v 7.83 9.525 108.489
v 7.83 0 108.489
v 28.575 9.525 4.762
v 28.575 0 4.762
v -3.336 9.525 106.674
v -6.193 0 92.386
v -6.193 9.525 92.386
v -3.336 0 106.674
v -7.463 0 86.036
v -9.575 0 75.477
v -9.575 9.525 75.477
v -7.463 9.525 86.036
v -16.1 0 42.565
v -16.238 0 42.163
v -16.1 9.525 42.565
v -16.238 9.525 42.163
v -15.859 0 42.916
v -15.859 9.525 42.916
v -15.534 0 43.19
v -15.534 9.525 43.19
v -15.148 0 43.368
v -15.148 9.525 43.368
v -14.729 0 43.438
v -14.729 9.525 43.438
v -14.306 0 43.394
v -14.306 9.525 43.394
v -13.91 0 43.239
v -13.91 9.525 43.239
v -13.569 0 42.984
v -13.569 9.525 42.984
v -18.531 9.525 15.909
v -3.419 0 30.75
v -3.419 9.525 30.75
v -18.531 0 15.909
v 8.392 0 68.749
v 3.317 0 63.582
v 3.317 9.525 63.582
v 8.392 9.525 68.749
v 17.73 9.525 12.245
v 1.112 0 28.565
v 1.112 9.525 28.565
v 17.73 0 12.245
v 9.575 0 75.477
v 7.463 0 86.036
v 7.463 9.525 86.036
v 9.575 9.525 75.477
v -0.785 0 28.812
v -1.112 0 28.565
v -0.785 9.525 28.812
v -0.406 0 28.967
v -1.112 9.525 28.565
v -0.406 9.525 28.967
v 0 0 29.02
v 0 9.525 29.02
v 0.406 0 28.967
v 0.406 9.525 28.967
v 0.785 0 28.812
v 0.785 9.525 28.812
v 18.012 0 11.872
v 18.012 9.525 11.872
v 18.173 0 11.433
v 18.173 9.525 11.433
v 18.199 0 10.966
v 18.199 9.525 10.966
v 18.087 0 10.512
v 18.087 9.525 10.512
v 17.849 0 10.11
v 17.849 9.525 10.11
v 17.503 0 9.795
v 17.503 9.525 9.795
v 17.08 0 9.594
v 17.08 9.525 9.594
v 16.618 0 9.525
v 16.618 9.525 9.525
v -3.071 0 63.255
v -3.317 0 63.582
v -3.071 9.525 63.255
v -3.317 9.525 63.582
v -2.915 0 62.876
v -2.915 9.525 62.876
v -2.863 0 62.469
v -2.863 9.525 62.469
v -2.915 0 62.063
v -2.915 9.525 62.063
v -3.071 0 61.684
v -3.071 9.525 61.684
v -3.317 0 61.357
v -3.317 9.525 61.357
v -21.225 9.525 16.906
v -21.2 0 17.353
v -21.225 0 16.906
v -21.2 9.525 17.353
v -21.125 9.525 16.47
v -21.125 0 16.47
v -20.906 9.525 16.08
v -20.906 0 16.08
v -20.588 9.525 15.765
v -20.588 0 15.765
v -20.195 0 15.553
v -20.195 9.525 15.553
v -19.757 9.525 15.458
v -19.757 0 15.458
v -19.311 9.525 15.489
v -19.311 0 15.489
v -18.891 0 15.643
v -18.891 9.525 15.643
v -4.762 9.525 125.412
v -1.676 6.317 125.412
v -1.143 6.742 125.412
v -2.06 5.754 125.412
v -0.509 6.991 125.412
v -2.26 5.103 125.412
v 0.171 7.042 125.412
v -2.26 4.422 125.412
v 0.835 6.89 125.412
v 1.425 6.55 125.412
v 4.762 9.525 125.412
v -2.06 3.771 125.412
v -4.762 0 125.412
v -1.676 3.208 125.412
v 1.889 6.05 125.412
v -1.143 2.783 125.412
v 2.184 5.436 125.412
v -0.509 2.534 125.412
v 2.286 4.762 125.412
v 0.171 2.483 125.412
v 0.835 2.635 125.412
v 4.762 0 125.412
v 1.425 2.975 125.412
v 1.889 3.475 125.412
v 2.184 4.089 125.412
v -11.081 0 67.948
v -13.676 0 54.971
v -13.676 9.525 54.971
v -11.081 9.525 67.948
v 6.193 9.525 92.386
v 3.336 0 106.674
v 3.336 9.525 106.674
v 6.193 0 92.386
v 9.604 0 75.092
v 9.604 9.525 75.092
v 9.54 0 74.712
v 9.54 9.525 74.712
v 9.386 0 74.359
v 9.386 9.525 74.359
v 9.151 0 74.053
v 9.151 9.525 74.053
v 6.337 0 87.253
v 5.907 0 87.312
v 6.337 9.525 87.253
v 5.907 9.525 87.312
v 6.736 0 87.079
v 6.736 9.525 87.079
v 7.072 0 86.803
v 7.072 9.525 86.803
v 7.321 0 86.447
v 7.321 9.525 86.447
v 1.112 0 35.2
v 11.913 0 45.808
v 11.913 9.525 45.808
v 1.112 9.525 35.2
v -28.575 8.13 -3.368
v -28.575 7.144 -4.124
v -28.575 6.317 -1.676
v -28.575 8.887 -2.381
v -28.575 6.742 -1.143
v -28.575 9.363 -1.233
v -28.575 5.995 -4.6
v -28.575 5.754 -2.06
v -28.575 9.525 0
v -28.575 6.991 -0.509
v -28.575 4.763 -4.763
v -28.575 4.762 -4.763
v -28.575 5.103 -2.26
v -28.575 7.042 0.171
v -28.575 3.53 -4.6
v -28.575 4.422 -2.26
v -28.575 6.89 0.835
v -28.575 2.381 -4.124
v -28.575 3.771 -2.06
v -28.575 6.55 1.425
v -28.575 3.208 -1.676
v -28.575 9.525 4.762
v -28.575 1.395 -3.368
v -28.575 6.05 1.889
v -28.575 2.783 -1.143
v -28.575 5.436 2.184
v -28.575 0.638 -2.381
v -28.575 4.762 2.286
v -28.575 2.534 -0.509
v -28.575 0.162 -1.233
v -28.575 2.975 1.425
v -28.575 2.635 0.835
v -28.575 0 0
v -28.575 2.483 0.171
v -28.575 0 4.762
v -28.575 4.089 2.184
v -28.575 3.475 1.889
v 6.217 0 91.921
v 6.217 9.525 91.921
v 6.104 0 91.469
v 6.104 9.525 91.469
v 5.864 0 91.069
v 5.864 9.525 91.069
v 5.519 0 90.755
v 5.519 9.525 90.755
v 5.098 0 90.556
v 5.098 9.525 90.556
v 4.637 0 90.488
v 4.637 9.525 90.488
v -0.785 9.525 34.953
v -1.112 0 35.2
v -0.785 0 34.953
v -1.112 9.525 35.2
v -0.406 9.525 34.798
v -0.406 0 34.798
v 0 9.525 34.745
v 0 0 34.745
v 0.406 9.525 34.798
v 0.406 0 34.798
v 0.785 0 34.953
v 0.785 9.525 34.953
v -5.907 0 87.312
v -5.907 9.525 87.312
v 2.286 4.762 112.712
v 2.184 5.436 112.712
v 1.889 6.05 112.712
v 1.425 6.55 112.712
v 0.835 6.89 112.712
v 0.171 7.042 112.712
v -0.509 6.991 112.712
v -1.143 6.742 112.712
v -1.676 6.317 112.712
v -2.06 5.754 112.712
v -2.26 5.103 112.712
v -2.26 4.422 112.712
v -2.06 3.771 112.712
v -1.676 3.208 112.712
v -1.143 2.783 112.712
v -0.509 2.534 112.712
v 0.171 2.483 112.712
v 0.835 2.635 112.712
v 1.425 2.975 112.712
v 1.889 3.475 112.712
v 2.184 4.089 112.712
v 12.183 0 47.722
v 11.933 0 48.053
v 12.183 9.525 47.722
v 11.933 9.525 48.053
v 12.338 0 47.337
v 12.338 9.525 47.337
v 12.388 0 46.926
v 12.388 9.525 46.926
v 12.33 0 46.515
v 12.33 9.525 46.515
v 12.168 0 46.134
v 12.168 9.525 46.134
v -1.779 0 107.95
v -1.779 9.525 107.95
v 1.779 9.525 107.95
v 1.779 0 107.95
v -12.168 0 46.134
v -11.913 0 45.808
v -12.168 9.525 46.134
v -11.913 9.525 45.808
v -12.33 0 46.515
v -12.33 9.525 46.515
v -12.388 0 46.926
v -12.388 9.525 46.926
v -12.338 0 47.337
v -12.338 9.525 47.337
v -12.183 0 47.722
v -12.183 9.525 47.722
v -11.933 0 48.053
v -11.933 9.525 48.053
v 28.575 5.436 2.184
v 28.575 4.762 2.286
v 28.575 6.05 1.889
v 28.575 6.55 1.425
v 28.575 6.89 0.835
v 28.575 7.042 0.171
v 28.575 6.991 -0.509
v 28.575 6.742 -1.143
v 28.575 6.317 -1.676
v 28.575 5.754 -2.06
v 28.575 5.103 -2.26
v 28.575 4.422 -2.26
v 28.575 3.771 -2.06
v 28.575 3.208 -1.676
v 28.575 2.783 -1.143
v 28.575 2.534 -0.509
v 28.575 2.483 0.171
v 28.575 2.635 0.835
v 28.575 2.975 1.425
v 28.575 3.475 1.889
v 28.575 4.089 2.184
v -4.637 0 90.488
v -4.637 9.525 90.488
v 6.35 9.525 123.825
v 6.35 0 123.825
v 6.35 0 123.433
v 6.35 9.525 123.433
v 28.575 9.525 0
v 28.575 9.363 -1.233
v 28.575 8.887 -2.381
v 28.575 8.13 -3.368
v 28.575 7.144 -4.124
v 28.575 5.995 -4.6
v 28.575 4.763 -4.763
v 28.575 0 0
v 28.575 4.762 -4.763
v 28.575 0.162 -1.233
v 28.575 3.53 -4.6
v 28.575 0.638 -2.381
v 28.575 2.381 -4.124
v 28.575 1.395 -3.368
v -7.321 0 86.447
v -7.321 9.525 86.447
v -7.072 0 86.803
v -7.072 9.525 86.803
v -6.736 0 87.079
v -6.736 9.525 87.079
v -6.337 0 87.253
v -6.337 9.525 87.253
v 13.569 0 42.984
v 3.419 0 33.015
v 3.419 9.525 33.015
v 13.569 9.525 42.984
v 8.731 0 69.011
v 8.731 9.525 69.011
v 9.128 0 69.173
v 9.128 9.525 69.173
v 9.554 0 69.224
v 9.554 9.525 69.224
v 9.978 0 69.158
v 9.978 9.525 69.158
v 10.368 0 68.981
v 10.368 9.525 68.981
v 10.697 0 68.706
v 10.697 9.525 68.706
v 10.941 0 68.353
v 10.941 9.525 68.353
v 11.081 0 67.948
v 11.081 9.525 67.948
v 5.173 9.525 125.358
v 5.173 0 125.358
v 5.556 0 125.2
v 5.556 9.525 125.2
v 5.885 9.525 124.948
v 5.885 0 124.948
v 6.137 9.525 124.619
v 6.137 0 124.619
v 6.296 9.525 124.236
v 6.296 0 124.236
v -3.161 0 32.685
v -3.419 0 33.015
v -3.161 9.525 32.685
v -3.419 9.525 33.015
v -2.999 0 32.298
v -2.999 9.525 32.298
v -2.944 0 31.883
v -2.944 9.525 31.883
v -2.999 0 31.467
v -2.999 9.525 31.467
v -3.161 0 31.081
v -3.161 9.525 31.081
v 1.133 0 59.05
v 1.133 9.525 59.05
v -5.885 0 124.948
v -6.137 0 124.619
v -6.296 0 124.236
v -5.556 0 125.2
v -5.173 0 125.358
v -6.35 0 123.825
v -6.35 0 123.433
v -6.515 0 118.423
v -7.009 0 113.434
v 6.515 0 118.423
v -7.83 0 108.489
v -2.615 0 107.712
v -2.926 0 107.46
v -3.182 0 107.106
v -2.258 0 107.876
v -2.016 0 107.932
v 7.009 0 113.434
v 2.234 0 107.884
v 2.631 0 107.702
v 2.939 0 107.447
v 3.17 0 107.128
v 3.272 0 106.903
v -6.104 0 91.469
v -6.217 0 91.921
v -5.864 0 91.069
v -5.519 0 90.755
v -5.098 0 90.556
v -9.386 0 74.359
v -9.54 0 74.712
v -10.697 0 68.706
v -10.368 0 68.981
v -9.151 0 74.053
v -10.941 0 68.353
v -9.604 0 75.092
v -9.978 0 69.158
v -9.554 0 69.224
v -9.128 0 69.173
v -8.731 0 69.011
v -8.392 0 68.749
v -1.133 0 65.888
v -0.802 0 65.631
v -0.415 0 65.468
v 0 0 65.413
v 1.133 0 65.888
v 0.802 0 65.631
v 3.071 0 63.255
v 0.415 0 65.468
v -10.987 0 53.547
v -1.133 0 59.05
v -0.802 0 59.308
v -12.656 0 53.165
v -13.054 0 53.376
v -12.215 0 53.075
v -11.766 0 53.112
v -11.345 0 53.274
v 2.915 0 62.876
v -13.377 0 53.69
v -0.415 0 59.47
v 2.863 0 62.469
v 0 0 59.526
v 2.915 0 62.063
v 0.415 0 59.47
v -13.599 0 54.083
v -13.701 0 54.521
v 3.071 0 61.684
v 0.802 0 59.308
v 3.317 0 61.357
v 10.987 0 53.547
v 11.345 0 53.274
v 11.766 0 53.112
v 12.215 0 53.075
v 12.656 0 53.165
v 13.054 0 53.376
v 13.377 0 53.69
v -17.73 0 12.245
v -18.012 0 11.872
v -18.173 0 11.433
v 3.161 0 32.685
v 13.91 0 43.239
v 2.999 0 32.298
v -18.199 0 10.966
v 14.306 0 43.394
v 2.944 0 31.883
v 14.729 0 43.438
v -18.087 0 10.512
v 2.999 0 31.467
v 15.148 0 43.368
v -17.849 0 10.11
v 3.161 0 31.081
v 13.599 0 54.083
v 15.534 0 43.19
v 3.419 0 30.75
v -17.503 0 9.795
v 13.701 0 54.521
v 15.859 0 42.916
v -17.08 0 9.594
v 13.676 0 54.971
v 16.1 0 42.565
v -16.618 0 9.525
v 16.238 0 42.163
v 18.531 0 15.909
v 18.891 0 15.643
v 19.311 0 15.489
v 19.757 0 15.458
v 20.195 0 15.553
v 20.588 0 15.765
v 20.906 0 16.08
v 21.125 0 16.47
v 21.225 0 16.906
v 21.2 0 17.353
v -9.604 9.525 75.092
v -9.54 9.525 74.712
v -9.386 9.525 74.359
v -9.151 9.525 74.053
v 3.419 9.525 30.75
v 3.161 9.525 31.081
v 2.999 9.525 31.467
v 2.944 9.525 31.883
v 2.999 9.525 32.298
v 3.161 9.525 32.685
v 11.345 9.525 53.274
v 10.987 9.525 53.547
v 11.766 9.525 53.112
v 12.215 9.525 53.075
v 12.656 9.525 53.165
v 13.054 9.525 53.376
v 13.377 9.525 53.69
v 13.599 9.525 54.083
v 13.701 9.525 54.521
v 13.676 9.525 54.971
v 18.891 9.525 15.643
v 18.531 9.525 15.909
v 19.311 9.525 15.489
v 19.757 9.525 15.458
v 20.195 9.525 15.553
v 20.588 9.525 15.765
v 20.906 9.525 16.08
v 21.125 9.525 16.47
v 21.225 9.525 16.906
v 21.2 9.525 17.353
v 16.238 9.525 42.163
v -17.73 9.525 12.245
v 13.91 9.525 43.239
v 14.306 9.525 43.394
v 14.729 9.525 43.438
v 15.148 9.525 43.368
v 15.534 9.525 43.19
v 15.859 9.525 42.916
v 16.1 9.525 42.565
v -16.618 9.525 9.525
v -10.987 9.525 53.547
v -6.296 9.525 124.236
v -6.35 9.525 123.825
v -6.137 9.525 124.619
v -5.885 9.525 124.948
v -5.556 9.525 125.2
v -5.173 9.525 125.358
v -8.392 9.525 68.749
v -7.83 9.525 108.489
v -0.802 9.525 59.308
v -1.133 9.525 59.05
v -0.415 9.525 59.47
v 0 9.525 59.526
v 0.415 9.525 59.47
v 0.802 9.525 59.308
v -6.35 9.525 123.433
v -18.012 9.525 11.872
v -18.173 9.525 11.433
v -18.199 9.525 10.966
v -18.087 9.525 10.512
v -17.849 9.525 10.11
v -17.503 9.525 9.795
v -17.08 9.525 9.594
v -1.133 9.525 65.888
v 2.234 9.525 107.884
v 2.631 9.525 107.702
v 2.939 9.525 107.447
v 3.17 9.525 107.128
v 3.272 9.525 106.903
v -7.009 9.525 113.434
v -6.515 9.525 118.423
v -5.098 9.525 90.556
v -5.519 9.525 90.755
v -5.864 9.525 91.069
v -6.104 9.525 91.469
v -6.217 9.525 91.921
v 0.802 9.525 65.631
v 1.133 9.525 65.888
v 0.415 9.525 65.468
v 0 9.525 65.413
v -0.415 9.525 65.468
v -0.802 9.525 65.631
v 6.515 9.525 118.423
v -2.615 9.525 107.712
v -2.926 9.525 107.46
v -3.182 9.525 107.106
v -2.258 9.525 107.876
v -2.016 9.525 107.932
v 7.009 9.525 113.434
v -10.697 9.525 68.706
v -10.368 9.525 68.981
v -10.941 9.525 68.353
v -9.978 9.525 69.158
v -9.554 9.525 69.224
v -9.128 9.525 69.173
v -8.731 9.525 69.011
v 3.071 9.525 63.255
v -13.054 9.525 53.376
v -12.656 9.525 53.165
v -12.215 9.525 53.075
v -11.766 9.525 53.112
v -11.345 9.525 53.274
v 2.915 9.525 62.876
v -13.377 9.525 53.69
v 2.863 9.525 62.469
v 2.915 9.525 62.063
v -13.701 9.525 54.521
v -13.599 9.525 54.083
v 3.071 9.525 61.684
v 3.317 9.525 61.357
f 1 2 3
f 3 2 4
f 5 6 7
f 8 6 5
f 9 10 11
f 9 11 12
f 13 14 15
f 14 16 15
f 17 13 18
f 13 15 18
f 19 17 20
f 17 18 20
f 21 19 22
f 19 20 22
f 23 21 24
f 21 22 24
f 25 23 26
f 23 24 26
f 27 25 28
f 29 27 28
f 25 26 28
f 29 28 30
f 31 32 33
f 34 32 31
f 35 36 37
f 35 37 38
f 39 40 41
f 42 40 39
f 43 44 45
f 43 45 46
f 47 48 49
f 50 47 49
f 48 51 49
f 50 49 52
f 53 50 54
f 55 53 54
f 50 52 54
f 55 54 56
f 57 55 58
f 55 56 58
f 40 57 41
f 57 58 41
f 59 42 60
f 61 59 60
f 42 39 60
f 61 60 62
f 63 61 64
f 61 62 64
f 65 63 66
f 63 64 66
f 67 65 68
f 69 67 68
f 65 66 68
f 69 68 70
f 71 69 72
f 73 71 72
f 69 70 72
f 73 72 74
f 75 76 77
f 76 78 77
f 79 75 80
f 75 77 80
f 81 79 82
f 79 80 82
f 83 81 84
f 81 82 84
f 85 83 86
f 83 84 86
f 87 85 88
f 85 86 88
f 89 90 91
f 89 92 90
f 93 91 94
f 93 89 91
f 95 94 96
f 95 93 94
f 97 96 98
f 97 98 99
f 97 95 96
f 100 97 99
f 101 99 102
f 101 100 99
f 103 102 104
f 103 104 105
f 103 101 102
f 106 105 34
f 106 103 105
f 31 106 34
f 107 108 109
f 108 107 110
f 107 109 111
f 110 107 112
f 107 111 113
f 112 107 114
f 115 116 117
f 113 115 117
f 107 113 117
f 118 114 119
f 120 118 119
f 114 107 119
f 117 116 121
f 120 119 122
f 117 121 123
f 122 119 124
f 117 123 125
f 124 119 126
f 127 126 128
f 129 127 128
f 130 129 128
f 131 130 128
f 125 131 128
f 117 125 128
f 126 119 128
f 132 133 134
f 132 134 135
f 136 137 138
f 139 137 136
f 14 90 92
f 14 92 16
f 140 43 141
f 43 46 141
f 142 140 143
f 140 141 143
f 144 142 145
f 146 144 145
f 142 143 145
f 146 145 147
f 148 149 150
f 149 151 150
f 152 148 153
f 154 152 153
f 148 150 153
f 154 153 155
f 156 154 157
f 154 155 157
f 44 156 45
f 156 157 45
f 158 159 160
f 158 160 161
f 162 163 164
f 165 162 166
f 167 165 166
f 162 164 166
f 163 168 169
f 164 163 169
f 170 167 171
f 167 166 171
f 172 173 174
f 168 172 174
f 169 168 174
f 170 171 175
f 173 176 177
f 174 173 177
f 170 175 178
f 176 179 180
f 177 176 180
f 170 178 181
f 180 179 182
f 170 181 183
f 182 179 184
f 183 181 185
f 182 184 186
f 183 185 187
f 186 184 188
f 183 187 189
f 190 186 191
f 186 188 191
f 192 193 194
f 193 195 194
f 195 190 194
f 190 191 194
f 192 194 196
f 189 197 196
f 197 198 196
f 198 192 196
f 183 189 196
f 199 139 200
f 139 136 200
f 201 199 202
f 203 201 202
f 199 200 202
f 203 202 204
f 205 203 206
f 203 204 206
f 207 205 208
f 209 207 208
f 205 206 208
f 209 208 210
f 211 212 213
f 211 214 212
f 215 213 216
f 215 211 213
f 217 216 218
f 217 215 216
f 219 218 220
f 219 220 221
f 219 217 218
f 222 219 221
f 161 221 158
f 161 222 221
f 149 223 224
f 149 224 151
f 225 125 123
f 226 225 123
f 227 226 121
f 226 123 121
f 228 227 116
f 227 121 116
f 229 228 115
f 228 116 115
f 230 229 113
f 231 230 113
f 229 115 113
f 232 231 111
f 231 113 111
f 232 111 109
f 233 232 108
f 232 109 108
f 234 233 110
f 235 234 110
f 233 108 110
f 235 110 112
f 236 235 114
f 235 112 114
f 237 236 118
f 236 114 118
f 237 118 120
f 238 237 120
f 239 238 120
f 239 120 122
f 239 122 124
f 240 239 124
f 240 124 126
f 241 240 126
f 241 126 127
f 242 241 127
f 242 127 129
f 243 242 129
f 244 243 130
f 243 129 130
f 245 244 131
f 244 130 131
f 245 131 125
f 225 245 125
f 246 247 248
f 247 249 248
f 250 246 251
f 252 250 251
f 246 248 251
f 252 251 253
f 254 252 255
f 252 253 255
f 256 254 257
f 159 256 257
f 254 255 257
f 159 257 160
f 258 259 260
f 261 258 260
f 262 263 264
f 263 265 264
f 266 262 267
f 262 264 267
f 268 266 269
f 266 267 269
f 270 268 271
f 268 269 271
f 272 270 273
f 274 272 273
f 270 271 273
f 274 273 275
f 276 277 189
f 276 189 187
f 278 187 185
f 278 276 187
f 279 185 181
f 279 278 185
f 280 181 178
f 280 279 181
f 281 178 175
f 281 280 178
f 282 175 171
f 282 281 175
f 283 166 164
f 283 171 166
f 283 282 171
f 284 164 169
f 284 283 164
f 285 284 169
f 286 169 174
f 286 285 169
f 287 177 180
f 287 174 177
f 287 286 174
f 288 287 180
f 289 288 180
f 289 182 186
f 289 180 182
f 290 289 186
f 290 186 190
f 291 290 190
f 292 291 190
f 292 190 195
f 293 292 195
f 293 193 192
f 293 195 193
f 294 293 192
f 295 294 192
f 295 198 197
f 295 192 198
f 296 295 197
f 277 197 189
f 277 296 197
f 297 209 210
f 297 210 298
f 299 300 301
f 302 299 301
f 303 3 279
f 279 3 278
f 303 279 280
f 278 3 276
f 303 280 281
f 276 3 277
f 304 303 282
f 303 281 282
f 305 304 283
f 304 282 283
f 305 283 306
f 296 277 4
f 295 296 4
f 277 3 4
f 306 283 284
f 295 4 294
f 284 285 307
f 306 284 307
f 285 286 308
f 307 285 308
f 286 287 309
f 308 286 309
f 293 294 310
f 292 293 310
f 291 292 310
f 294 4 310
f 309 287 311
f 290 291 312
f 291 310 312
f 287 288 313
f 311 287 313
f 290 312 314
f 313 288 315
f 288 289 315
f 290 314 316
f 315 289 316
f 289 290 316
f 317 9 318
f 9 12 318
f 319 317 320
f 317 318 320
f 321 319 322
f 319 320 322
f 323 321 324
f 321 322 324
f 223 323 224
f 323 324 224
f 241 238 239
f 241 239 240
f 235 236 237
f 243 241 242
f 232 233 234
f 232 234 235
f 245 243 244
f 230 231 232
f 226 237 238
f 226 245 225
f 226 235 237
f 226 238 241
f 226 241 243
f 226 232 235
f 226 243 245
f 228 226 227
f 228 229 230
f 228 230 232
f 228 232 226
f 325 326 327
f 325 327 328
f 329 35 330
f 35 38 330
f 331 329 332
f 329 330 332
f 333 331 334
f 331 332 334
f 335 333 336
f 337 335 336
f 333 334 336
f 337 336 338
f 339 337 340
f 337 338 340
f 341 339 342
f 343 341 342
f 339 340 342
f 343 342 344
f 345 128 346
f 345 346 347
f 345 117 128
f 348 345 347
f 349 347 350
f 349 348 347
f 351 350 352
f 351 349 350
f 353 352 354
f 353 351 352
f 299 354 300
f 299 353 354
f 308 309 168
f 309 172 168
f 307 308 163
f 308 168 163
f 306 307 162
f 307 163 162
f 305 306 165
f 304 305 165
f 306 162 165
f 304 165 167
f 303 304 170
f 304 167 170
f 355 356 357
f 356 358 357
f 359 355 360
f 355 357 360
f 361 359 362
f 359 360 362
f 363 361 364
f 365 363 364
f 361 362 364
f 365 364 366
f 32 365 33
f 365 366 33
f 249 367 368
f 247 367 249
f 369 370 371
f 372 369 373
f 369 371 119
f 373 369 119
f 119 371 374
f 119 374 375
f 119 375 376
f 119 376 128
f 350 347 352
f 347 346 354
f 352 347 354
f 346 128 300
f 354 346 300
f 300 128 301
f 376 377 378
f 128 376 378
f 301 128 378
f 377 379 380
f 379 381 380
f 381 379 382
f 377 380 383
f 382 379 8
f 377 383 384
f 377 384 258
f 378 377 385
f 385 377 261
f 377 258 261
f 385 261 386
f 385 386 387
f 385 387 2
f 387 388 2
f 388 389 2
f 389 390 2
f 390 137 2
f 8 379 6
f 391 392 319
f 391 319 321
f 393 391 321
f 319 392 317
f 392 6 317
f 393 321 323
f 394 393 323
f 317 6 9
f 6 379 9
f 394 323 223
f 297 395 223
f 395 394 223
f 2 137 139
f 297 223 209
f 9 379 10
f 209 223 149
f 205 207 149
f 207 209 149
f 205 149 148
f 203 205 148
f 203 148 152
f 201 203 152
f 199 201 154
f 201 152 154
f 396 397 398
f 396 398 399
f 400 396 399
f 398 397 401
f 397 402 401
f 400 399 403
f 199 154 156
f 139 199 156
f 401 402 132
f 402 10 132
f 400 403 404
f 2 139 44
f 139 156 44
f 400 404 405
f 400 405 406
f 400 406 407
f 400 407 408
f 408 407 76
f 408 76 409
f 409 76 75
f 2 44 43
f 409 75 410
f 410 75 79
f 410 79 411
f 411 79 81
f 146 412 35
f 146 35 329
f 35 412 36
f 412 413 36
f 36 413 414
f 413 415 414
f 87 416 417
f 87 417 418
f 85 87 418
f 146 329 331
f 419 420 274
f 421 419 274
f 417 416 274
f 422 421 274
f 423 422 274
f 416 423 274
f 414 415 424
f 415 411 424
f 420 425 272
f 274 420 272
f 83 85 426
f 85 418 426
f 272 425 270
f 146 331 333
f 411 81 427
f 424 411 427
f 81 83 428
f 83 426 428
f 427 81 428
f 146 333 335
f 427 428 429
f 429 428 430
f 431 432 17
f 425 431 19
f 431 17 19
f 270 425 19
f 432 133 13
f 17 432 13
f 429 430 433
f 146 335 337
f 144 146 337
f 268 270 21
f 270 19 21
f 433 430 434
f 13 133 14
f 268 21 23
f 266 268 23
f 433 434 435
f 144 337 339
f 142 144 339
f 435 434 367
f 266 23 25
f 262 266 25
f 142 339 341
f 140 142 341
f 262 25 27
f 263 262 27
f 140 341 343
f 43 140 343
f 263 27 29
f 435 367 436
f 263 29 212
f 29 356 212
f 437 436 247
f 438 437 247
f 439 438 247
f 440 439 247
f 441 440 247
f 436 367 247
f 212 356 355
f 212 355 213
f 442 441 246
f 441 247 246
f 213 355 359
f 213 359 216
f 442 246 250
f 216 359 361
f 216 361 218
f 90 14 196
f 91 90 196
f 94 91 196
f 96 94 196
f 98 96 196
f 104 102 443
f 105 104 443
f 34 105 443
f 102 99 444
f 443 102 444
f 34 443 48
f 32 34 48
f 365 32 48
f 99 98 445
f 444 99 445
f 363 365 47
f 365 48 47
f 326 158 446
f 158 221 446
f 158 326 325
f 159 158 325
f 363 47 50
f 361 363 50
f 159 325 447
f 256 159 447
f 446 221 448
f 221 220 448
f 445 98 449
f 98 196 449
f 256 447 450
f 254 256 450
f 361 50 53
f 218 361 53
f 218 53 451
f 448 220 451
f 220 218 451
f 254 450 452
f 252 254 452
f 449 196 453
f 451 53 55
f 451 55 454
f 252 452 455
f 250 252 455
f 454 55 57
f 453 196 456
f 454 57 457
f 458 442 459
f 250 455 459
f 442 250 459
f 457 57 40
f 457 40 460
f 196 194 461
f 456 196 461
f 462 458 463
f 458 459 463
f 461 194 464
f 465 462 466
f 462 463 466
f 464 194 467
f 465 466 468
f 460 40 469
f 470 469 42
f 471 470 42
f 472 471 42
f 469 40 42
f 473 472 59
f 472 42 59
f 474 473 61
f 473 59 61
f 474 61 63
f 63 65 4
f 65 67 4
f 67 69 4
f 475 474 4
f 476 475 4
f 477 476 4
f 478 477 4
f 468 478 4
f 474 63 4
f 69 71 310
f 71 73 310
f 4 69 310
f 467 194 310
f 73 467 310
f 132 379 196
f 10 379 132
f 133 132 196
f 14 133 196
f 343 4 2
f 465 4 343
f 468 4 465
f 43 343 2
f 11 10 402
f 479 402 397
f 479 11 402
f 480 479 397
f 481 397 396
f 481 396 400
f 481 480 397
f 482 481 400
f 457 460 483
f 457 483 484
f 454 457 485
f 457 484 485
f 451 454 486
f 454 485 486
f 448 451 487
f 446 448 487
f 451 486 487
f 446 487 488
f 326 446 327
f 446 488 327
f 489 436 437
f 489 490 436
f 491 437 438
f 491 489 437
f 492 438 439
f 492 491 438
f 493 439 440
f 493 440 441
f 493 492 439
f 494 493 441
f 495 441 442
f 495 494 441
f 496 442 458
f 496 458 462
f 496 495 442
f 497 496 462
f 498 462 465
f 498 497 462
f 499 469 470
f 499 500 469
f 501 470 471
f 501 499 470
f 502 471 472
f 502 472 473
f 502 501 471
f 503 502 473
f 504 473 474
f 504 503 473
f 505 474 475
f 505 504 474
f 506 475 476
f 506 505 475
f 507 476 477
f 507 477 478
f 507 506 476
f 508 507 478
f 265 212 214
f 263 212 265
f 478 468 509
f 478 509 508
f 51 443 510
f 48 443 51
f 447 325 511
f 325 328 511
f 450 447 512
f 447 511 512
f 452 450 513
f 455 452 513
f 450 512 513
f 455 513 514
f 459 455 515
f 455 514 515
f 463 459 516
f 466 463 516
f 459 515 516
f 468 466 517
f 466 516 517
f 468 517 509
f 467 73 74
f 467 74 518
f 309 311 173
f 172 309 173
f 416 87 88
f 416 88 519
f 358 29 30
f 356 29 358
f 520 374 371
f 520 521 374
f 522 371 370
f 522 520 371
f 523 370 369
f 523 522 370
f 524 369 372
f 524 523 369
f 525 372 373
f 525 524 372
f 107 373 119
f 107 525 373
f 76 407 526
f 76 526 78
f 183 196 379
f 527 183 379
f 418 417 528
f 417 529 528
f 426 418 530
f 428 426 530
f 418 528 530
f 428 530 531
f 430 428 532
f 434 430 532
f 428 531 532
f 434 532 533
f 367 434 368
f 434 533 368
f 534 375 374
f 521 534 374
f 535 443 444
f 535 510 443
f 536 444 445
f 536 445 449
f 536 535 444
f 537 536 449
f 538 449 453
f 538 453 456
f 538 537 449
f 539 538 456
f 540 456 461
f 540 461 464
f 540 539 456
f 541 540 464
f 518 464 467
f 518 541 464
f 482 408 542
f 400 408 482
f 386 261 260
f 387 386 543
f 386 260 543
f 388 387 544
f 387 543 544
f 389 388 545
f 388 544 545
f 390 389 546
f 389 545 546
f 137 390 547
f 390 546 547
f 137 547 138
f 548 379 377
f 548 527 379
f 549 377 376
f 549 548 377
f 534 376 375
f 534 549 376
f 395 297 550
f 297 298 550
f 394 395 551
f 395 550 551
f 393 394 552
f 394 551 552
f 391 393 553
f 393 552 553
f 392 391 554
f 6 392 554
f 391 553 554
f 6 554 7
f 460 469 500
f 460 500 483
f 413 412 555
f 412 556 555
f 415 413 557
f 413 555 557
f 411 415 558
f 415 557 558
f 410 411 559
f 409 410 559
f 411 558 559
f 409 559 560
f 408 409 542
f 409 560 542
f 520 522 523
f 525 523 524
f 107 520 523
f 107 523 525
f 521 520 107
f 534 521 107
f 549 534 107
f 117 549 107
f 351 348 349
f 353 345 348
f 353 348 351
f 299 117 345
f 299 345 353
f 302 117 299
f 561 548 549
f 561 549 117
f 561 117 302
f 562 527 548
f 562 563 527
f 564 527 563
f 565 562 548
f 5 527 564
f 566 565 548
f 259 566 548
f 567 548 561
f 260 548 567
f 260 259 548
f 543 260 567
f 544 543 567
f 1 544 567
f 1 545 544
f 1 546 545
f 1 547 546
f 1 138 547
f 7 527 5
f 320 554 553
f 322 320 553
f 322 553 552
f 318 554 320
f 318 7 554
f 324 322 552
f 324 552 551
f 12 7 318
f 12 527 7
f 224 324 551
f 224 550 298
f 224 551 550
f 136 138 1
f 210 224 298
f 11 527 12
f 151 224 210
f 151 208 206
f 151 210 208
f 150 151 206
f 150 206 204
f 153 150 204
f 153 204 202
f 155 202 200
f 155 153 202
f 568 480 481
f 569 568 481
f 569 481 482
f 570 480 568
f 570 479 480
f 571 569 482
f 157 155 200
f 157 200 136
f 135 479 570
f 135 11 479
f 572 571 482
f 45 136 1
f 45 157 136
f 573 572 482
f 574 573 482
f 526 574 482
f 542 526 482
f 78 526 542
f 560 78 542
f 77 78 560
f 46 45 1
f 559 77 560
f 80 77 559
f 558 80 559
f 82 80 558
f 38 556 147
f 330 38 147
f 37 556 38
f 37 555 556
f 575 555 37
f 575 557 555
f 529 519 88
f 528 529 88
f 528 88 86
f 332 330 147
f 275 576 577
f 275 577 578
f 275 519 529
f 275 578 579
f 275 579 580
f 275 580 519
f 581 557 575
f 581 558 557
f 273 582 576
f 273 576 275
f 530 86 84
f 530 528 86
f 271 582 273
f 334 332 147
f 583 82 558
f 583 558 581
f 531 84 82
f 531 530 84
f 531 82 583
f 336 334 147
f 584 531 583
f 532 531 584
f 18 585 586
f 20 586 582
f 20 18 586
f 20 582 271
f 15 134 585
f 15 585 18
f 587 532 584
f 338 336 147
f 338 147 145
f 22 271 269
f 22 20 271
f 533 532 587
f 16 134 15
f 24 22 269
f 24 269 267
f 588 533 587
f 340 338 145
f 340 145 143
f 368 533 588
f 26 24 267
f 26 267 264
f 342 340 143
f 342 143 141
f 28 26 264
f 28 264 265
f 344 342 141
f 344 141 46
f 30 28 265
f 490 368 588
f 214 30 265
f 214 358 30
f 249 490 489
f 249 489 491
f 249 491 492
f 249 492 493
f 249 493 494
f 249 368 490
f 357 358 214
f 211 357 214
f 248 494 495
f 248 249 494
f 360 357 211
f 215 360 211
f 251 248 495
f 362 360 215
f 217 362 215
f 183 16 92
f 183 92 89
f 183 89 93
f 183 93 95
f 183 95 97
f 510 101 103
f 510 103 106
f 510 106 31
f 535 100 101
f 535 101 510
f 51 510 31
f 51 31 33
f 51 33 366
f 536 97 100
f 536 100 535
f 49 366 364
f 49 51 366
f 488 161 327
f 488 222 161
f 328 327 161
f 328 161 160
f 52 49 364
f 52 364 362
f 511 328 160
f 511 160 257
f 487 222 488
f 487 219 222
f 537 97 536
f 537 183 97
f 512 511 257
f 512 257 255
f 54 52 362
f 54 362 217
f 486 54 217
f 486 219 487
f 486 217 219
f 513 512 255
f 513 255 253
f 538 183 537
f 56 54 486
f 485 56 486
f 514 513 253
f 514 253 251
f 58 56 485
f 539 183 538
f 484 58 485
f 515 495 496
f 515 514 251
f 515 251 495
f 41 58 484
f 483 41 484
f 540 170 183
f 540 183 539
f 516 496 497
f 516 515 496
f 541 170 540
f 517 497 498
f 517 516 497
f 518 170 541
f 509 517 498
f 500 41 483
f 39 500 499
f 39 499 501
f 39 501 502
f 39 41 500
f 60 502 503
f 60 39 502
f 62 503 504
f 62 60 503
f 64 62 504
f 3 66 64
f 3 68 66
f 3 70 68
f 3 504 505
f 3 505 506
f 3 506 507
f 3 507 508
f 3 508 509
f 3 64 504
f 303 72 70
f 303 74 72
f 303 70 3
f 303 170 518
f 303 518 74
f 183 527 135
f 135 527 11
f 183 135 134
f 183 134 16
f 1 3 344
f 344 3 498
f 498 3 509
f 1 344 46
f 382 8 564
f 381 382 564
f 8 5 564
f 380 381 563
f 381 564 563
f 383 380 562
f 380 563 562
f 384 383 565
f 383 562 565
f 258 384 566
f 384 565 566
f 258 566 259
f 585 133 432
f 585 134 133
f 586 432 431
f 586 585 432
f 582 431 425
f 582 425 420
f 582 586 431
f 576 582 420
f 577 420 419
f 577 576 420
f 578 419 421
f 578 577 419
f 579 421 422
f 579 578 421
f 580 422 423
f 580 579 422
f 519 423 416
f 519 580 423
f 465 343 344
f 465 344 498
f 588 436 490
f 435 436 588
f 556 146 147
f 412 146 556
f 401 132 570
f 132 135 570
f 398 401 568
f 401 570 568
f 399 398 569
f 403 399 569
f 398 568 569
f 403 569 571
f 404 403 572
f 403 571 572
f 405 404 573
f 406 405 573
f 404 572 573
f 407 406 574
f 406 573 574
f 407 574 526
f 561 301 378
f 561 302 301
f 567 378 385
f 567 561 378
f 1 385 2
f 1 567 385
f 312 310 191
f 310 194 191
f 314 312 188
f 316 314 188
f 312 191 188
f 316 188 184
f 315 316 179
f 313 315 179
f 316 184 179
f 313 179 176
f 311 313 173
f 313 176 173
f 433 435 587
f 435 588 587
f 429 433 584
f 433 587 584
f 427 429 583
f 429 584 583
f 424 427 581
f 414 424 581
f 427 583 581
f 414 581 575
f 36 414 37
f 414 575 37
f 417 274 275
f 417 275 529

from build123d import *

# Parameters (mm, degrees)
BOSS_EXTRUDE1_DEPTH     = 9.525
CUT_EXTRUDE2_DEPTH      = 139.148989433
CUT_EXTRUDE2_DEPTH_BACK = 139.148989433
SKETCH6_R               = 2.286
SKETCH7_R               = 2.286
CUT_EXTRUDE3_DEPTH      = 12.7
FILLET3_R               = 76.2
FILLET4_R               = 1.5875
FILLET5_R               = 4.7625
CUT_EXTRUDE4_DEPTH      = 129.978879691
CUT_EXTRUDE4_DEPTH_BACK = 129.978879691
FILLET6_R               = 1.5875


with BuildPart() as part:
    # Sketch1 → Boss-Extrude1 (new body)
    with BuildSketch(Plane(origin=(0, 0, 0), x_dir=(1, 0, 0), z_dir=(0, 1, 0))):
        Polygon((-28.575, 4.7625), (-28.575, -4.7625), (-6.35, -115.8875), (-6.35, -125.4125), (6.35, -125.4125), (6.35, -115.8875), (28.575, -4.7625), (28.575, 4.7625), align=None)
    extrude(amount=BOSS_EXTRUDE1_DEPTH)

    # Sketch6 → Cut-Extrude2 (cut, two sides: drawn at the far end of the back side and taken through both)
    with BuildSketch(Plane.ZY.offset(28.575).offset(-CUT_EXTRUDE2_DEPTH_BACK)):
        with Locations((0, 4.7625)):
            Circle(SKETCH6_R)
    extrude(amount=CUT_EXTRUDE2_DEPTH + CUT_EXTRUDE2_DEPTH_BACK, mode=Mode.SUBTRACT)

    # Sketch7 → Cut-Extrude3 (cut)
    with BuildSketch(Plane.XY.offset(125.4125)):
        with Locations((0, 4.7625)):
            Circle(SKETCH7_R)
    extrude(amount=-CUT_EXTRUDE3_DEPTH, mode=Mode.SUBTRACT)

    # Fillet3
    fillet3_edges = [part.edges().sort_by_distance(p)[0] for p in [
        (6.35, 4.7625, 115.8875),
        (-6.35, 4.7625, 115.8875),
    ]]
    fillet(fillet3_edges, radius=FILLET3_R)

    # Fillet4
    fillet4_edges = [part.edges().sort_by_distance(p)[0] for p in [
        (6.35, 4.7625, 125.4125),
        (-6.35, 4.7625, 125.4125),
    ]]
    fillet(fillet4_edges, radius=FILLET4_R)

    # Fillet5
    fillet5_edges = [part.edges().sort_by_distance(p)[0] for p in [
        (0, 0, -4.7625),
        (0, 9.525, -4.7625),
    ]]
    fillet(fillet5_edges, radius=FILLET5_R - 0.0001)  # a hair under: the kernel refuses the full size

    # Sketch8 → Cut-Extrude4 (cut, two sides: drawn at the far end of the back side and taken through both)
    with BuildSketch(Plane(origin=(0, 9.525, 0), x_dir=(1, 0, 0), z_dir=(0, 1, 0)).offset(-CUT_EXTRUDE4_DEPTH_BACK)):
        with BuildLine():
            ThreePointArc((-3.159737044, -107.554734345), (-3.120475766, -107.752318634), (-3.081706229, -107.95))
            Line((-3.081706229, -107.95), (3.081706229, -107.95))
            ThreePointArc((3.081706229, -107.95), (3.120475766, -107.752318634), (3.159737044, -107.554734345))
            Line((3.159737044, -107.554734345), (6.573183913, -90.4875))
            Line((6.573183913, -90.4875), (-6.573183913, -90.4875))
            Line((-6.573183913, -90.4875), (-3.159737044, -107.554734345))
        make_face()
        Polygon((0, -64.734965609), (-9.740127938, -74.652779875), (-7.208183913, -87.3125), (7.208183913, -87.3125), (9.740127938, -74.652779875), align=None)
        Polygon((10.493050249, -70.888168322), (14.721754664, -49.744646246), (2.225043776, -62.469331006), align=None)
        Polygon((-2.225043776, -62.469331006), (-14.721754664, -49.744646246), (-10.493050249, -70.888168322), align=None)
        Polygon((13.045786034, -46.919919878), (0, -34.107860525), (-13.045786034, -46.919919878), (0, -60.203696402), align=None)
        Polygon((-2.265634604, -31.882816749), (-22.211903335, -12.29390289), (-15.662709625, -45.03987144), align=None)
        Polygon((20.50004931, -9.525), (-20.50004931, -9.525), (0, -29.657772974), align=None)
        Polygon((15.662709625, -45.03987144), (22.211903335, -12.29390289), (2.265634604, -31.882816749), align=None)
    extrude(amount=CUT_EXTRUDE4_DEPTH + CUT_EXTRUDE4_DEPTH_BACK, mode=Mode.SUBTRACT)

    # Fillet6
    fillet6_edges = [part.edges().sort_by_distance(p)[0] for p in [
        (3.081706229, 4.7625, 107.95),
        (-3.081706229, 4.7625, 107.95),
        (-6.573183913, 4.7625, 90.4875),
        (6.573183913, 4.7625, 90.4875),
        (-15.662709625, 4.7625, 45.03987144),
        (-22.211903335, 4.7625, 12.29390289),
        (-2.265634604, 4.7625, 31.882816749),
        (2.265634604, 4.7625, 31.882816749),
        (22.211903335, 4.7625, 12.29390289),
        (15.662709625, 4.7625, 45.03987144),
        (10.493050249, 4.7625, 70.888168322),
        (2.225043776, 4.7625, 62.469331006),
        (14.721754664, 4.7625, 49.744646246),
        (9.740127938, 4.7625, 74.652779875),
        (7.208183913, 4.7625, 87.3125),
        (-7.208183913, 4.7625, 87.3125),
        (-9.740127938, 4.7625, 74.652779875),
        (13.045786034, 4.7625, 46.919919878),
        (0, 4.7625, 60.203696402),
        (-13.045786034, 4.7625, 46.919919878),
        (0, 4.7625, 34.107860525),
        (-2.225043776, 4.7625, 62.469331006),
        (-10.493050249, 4.7625, 70.888168322),
        (-14.721754664, 4.7625, 49.744646246),
        (20.50004931, 4.7625, 9.525),
        (0, 4.7625, 29.657772974),
        (-20.50004931, 4.7625, 9.525),
        (0, 4.7625, 64.734965609),
    ]]
    fillet(fillet6_edges, radius=FILLET6_R)


solid = part.part
